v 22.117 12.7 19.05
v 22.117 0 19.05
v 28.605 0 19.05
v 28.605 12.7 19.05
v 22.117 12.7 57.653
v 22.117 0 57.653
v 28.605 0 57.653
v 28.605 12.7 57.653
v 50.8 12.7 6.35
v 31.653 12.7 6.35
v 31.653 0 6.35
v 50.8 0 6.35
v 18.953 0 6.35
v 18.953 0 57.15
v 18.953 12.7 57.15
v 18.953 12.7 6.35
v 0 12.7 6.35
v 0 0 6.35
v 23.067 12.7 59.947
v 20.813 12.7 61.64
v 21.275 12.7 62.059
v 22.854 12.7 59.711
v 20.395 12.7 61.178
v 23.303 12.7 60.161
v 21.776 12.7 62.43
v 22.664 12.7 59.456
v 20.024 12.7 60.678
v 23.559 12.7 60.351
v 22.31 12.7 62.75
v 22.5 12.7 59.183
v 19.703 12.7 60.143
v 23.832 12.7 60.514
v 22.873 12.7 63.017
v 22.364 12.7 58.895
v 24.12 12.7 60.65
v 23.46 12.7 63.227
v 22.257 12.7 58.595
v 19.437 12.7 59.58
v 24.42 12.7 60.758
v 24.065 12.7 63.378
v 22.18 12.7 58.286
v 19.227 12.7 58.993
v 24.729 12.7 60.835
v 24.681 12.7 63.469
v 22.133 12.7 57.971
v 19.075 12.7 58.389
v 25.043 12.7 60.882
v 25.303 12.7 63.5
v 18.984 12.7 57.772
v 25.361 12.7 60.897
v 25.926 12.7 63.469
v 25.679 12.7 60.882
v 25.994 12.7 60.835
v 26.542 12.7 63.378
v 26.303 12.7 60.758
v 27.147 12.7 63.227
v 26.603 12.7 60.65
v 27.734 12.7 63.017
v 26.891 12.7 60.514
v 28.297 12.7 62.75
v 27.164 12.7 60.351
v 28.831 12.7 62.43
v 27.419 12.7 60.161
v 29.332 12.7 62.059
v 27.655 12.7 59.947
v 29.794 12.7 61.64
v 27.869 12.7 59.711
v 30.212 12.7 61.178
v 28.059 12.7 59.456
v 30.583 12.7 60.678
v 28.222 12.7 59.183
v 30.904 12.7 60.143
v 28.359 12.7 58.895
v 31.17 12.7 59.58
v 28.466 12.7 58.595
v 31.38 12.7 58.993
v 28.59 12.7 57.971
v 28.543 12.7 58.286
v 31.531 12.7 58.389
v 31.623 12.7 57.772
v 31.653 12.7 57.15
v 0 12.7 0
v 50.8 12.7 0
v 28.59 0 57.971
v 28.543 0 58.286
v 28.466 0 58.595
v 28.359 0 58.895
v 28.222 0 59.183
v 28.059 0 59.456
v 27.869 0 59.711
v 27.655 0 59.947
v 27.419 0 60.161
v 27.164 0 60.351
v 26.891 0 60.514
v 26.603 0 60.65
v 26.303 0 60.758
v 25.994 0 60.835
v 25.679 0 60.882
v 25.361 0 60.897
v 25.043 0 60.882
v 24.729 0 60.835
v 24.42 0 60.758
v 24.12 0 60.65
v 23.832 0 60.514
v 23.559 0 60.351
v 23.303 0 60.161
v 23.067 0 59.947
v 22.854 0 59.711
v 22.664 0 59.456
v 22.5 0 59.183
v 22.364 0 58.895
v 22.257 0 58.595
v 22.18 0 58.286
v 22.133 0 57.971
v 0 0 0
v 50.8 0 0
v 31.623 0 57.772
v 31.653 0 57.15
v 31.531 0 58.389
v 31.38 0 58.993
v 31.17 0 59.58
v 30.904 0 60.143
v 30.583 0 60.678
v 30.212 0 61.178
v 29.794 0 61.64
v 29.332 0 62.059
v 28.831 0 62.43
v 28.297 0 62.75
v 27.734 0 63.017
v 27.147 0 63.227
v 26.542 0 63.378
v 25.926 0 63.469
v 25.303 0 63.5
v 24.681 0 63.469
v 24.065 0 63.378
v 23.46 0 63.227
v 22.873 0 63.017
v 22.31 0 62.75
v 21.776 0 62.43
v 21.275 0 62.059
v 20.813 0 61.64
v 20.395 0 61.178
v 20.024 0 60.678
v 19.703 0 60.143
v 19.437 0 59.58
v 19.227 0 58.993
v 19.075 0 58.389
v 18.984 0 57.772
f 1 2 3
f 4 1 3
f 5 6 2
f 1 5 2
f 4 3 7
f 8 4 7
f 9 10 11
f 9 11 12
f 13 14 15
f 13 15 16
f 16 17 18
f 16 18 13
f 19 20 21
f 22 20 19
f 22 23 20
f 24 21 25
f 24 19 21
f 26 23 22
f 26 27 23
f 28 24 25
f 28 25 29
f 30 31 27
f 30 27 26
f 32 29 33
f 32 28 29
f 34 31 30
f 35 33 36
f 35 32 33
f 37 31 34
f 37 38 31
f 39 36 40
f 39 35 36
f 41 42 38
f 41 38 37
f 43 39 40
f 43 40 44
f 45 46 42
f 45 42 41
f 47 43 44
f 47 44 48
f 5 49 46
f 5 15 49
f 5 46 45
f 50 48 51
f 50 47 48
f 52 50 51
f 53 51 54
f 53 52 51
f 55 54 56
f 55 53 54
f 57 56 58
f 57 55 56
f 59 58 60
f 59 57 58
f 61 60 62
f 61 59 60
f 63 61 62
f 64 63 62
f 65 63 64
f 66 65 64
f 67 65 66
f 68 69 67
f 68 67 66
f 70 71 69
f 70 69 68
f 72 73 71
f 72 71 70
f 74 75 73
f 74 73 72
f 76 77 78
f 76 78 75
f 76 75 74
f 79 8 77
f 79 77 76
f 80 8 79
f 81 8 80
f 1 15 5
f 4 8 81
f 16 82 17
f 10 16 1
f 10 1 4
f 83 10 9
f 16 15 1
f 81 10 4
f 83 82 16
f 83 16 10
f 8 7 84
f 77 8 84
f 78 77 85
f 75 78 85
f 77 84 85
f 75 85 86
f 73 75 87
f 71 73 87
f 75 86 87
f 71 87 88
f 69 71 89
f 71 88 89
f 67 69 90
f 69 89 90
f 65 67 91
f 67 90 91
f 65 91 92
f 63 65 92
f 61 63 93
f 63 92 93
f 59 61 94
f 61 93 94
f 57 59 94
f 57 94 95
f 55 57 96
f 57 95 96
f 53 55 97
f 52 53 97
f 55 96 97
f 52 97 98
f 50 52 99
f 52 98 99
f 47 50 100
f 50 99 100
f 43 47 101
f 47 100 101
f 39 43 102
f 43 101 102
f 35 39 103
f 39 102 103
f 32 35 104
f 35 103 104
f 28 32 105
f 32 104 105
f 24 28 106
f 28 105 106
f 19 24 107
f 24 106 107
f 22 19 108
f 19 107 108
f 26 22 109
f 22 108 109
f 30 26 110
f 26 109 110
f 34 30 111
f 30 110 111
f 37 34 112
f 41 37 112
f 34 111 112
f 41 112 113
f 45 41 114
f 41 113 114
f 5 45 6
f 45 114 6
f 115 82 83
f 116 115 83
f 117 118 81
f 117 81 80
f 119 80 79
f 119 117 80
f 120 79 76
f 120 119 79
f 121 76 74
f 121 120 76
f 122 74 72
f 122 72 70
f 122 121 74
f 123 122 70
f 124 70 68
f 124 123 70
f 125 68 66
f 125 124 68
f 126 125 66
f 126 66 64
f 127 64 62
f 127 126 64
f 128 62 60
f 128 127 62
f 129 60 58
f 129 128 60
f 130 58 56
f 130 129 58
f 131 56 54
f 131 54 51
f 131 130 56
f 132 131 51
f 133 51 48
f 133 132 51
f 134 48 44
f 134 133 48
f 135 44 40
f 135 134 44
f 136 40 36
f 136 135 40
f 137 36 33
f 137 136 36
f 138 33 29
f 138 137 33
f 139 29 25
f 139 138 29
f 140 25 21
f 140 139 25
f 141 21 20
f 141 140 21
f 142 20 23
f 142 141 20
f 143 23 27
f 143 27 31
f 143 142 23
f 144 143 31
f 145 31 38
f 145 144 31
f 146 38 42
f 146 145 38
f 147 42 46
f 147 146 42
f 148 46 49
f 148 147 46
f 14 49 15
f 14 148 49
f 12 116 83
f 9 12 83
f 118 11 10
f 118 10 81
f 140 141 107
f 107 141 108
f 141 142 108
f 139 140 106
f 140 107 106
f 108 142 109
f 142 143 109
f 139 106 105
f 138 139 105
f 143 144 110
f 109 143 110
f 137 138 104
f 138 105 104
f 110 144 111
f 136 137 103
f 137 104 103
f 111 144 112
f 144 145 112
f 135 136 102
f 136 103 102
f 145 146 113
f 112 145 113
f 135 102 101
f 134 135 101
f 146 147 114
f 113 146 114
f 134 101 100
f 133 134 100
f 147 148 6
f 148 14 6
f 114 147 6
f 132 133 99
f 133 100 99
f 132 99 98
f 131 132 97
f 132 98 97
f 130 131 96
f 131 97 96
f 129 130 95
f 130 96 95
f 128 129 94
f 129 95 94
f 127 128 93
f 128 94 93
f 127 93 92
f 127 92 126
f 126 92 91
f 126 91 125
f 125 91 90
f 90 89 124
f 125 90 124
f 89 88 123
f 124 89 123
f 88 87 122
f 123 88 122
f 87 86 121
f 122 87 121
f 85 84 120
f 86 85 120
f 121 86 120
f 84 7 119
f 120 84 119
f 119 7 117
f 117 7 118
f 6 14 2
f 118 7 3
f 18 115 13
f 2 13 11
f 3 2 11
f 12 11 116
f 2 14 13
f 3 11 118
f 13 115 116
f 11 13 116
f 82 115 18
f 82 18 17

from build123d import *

# Parameters (mm, degrees)
SKETCH1_W           = 50.8
SKETCH1_H           = 12.7
BOSS_EXTRUDE1_DEPTH = 6.35
BOSS_EXTRUDE2_DEPTH = 12.7


with BuildPart() as part:
    # Sketch1 → Boss-Extrude1 (new body)
    with BuildSketch(Plane.XY):
        with Locations((25.4, 6.35)):
            Rectangle(SKETCH1_W, SKETCH1_H)
    extrude(amount=BOSS_EXTRUDE1_DEPTH)

    # Sketch4 → Boss-Extrude2 (add)
    with BuildSketch(Plane.XZ):
        with BuildLine():
            Line((18.953484491, 6.35), (31.653484491, 6.35))
            Line((31.653484491, 6.35), (31.653484491, 57.15))
            ThreePointArc((31.653484491, 57.15), (25.303484491, 63.5), (18.953484491, 57.15))
            Line((18.953484491, 57.15), (18.953484491, 6.35))
        make_face()
        with BuildLine():
            Line((22.117326524, 57.65327603), (22.117326524, 19.05))
            Line((22.117326524, 19.05), (28.605484491, 19.05))
            Line((28.605484491, 19.05), (28.605484491, 57.65327603))
            ThreePointArc((28.605484491, 57.65327603), (25.361405508, 60.897355013), (22.117326524, 57.65327603))
        make_face(mode=Mode.SUBTRACT)
    extrude(amount=-BOSS_EXTRUDE2_DEPTH)


solid = part.part
